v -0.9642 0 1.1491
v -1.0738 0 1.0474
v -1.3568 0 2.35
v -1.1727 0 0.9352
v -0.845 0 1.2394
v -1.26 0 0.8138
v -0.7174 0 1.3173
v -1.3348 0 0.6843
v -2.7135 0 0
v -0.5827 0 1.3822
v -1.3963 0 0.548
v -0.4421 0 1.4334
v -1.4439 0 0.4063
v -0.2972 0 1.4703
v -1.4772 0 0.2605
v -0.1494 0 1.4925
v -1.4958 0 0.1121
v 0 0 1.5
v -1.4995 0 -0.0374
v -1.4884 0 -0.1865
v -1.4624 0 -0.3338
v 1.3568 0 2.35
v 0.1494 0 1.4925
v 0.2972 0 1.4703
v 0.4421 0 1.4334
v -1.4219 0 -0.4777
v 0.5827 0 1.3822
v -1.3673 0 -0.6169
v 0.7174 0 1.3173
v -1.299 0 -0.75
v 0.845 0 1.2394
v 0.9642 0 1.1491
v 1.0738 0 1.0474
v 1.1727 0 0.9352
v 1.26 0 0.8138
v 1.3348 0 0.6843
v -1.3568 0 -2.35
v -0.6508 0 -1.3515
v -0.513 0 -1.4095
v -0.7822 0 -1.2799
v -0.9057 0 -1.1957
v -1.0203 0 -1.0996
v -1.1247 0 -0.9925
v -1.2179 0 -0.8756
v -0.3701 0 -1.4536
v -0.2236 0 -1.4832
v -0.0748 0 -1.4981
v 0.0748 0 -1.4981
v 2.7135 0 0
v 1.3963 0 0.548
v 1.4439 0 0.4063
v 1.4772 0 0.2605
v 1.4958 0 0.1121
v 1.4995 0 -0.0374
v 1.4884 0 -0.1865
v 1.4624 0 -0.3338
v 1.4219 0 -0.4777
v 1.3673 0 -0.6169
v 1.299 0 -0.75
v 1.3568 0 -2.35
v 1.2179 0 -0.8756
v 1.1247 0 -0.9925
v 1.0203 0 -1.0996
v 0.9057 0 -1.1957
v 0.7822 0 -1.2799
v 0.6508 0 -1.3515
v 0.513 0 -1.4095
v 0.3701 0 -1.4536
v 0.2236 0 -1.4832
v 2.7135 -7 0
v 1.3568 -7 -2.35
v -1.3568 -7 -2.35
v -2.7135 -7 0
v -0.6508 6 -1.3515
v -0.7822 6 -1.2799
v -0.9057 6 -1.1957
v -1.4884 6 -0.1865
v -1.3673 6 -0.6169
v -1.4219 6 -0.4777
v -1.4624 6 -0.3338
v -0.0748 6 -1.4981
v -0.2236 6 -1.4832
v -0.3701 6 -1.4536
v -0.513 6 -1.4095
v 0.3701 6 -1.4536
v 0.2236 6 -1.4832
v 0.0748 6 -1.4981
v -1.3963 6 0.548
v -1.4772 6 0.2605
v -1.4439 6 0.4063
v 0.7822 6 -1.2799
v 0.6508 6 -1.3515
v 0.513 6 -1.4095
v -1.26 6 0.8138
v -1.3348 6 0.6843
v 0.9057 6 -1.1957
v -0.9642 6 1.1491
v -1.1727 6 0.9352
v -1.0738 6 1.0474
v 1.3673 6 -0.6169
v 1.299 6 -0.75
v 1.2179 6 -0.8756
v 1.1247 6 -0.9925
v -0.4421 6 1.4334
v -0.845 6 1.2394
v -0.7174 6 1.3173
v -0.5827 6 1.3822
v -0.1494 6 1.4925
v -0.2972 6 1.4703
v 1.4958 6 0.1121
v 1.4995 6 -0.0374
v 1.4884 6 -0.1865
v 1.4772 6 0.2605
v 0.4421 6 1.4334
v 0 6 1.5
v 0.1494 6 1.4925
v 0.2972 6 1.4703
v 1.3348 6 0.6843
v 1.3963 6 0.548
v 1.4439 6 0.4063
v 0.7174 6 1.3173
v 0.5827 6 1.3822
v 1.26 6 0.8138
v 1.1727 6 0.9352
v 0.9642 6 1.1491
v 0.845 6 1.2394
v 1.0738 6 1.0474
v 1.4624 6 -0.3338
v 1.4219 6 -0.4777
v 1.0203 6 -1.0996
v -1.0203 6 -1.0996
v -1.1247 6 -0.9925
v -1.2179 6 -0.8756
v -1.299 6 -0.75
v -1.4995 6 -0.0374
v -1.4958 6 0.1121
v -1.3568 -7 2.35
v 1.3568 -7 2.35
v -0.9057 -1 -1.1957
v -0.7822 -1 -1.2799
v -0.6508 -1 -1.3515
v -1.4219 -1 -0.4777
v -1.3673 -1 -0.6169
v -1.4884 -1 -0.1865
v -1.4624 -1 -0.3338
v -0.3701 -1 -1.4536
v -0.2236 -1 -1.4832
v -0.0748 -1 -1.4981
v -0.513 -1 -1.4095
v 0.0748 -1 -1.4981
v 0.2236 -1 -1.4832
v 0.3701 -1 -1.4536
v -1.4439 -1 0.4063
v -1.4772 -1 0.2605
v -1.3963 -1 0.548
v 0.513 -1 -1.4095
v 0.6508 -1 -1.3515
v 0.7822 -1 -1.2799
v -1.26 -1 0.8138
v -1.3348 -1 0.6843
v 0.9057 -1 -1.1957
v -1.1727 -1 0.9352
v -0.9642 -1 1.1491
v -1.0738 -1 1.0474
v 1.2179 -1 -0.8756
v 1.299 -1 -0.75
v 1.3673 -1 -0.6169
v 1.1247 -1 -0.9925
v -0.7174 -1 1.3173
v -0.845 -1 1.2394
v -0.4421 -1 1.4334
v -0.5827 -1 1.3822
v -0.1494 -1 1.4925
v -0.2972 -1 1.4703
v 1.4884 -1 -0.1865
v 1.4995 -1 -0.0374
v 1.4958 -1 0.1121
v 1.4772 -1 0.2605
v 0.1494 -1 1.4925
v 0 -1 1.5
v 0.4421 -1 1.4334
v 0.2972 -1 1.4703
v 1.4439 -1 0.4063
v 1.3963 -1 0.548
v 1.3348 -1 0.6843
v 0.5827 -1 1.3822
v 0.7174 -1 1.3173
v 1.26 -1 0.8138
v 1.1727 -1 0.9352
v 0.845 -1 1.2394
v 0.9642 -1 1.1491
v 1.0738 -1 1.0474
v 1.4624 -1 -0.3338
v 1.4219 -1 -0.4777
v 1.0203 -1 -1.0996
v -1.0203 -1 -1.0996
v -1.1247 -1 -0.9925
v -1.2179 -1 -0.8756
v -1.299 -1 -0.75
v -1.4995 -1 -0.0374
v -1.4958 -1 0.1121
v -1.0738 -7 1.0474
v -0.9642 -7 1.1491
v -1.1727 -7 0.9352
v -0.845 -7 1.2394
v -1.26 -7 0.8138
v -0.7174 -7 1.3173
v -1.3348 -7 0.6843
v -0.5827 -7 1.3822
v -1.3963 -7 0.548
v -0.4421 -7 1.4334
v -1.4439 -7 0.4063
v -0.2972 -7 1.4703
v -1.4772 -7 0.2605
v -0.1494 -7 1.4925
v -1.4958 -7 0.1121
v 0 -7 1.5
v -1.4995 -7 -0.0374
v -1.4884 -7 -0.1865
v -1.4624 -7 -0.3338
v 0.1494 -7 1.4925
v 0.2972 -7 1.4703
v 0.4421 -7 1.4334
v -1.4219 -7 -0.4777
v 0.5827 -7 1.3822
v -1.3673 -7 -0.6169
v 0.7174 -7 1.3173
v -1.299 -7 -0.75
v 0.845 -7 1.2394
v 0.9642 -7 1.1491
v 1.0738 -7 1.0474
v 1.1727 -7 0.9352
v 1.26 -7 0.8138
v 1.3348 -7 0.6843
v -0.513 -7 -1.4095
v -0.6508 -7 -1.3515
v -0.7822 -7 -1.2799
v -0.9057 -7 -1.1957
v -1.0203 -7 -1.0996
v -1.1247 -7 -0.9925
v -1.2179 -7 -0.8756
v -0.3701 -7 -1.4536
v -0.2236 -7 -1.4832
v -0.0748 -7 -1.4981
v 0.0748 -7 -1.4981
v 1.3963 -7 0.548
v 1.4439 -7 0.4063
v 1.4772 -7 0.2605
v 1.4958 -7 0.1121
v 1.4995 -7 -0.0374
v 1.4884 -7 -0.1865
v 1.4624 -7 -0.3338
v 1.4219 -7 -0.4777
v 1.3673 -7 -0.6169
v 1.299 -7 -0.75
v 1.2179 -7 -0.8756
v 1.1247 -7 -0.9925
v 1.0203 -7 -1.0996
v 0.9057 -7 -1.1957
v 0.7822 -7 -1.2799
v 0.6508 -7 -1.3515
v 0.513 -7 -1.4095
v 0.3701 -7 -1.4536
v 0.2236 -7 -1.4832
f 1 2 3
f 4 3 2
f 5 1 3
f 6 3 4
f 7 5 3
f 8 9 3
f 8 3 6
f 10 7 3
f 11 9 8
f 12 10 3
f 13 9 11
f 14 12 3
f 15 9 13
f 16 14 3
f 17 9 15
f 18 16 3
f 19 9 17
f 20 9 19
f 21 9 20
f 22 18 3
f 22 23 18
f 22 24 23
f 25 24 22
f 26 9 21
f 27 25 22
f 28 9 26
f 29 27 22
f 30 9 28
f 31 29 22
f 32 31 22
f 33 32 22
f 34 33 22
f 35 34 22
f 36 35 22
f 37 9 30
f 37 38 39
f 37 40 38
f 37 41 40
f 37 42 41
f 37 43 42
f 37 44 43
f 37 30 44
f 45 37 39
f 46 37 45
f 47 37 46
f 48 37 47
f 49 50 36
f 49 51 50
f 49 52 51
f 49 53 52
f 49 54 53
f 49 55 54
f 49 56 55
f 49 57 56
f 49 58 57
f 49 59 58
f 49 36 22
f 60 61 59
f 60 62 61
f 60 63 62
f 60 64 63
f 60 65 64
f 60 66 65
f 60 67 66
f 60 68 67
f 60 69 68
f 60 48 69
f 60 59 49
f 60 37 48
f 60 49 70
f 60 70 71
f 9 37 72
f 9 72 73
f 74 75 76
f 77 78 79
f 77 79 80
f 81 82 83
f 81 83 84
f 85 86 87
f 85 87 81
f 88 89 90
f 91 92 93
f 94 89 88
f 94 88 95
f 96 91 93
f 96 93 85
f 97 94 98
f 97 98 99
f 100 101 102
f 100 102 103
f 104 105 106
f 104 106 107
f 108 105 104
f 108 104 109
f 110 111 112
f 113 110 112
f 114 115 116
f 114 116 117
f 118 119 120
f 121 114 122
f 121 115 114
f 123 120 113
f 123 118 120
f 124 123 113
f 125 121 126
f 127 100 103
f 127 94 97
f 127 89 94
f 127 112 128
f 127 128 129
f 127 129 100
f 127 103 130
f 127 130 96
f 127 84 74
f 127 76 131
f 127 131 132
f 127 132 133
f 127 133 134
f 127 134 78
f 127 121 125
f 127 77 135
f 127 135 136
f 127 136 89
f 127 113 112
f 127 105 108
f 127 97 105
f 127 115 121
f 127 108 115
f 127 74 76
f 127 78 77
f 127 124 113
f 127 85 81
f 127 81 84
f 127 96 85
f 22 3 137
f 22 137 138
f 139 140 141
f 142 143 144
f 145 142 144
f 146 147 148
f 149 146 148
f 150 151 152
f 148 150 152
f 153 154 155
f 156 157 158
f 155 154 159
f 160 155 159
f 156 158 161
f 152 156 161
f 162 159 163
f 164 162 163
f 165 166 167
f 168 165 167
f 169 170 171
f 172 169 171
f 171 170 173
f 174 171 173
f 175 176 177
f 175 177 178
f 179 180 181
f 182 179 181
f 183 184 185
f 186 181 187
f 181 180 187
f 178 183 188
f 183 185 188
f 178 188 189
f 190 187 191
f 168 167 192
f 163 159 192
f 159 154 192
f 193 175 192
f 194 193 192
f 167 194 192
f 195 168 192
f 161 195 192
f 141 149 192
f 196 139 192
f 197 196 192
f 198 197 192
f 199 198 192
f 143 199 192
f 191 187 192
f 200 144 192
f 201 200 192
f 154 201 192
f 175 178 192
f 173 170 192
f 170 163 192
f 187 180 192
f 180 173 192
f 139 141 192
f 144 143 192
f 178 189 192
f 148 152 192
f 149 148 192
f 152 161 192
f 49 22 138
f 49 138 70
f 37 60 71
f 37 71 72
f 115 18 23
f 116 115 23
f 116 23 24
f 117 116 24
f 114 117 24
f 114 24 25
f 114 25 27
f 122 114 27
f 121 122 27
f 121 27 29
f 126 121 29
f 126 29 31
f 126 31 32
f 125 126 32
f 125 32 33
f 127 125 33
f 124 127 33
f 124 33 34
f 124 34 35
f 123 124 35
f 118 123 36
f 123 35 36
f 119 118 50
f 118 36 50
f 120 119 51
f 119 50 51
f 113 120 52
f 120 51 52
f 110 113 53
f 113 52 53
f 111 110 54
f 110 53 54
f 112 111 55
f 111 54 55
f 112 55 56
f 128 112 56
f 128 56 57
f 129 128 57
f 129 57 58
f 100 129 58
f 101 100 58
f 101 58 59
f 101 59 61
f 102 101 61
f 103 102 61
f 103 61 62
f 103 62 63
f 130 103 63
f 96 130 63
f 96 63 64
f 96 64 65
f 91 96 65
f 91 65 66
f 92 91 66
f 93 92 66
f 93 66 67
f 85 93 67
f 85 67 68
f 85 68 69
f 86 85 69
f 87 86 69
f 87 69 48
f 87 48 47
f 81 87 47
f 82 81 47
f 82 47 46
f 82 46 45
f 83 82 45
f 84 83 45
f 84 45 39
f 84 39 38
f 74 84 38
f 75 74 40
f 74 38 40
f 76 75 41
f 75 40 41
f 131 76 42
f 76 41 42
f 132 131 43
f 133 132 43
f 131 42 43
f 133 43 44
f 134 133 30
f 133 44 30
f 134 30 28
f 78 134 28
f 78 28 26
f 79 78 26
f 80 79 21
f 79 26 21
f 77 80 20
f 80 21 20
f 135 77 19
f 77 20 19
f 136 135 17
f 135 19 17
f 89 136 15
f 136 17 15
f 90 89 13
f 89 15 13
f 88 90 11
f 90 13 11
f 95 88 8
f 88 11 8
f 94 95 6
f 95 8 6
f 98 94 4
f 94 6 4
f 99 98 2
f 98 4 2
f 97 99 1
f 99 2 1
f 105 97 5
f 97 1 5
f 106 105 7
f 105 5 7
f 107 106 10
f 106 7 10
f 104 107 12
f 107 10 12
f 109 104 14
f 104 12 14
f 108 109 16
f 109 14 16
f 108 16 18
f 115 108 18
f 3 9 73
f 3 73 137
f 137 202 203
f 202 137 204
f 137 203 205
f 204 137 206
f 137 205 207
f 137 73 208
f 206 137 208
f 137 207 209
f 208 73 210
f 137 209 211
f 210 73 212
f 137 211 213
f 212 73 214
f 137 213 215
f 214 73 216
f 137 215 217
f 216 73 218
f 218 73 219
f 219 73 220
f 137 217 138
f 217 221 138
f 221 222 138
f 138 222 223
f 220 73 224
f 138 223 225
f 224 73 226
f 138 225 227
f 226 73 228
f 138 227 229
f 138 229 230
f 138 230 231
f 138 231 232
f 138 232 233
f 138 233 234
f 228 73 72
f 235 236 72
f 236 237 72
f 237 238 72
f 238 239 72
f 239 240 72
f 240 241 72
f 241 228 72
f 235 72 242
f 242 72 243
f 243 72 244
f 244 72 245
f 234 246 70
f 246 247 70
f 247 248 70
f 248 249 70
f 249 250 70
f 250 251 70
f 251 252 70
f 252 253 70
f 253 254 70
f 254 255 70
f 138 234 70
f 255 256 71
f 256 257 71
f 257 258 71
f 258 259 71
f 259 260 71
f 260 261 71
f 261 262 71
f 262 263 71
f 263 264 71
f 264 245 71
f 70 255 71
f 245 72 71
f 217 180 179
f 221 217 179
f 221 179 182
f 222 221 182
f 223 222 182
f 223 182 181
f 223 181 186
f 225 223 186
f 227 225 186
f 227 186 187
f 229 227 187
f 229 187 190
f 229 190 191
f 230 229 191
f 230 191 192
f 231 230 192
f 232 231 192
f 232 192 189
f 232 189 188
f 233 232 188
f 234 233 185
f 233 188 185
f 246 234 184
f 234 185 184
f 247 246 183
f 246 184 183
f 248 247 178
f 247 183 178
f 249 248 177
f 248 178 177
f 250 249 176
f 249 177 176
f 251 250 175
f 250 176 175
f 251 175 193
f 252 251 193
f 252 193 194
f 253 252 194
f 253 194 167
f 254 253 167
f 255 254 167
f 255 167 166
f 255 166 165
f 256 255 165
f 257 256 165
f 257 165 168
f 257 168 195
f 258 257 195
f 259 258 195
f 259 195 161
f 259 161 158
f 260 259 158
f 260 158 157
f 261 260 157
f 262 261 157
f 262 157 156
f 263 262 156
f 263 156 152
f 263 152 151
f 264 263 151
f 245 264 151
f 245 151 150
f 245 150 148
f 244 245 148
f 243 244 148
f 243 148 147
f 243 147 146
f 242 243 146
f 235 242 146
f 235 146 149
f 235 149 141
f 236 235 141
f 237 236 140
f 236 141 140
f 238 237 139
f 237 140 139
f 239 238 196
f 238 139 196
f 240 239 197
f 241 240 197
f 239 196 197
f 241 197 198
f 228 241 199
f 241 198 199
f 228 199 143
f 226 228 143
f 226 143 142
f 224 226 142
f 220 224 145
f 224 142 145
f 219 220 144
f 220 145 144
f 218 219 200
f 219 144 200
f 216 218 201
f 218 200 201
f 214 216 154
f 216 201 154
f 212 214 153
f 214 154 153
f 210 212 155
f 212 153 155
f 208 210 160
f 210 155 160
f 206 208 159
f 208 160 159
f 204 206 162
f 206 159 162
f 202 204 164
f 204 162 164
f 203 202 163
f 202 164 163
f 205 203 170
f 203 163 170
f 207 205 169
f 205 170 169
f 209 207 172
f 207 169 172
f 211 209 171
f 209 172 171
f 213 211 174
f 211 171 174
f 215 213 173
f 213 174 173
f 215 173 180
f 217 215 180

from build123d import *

# Parameters (mm, degrees)
SKETCH_1_R           = 1.5
EXTRUDE_1_DEPTH      = 7
EXTRUDE_2_DEPTH      = 6
EXTRUDE_2_DEPTH_BACK = 1
SKETCH_1_4_R         = 1.5


with BuildPart() as part:
    # 草图1 → 凸台-拉伸1 (new body)
    with BuildSketch(Plane(origin=(0, 0, 0), x_dir=(1, 0, 0), z_dir=(0, 1, 0))):
        Polygon((2.713546265, 0), (1.356773133, 2.35), (-1.356773133, 2.35), (-2.713546265, 0), (-1.356773133, -2.35), (1.356773133, -2.35), align=None)
        Circle(SKETCH_1_R, mode=Mode.SUBTRACT)
    extrude(amount=-EXTRUDE_1_DEPTH)

    # 草图1<4> → 凸台-拉伸2 (add, two sides: drawn at the far end of the back side and taken through both)
    with BuildSketch(Plane(origin=(0, 0, 0), x_dir=(1, 0, 0), z_dir=(0, 1, 0)).offset(-EXTRUDE_2_DEPTH_BACK)):
        Circle(SKETCH_1_4_R)
    extrude(amount=EXTRUDE_2_DEPTH + EXTRUDE_2_DEPTH_BACK)


solid = part.part
